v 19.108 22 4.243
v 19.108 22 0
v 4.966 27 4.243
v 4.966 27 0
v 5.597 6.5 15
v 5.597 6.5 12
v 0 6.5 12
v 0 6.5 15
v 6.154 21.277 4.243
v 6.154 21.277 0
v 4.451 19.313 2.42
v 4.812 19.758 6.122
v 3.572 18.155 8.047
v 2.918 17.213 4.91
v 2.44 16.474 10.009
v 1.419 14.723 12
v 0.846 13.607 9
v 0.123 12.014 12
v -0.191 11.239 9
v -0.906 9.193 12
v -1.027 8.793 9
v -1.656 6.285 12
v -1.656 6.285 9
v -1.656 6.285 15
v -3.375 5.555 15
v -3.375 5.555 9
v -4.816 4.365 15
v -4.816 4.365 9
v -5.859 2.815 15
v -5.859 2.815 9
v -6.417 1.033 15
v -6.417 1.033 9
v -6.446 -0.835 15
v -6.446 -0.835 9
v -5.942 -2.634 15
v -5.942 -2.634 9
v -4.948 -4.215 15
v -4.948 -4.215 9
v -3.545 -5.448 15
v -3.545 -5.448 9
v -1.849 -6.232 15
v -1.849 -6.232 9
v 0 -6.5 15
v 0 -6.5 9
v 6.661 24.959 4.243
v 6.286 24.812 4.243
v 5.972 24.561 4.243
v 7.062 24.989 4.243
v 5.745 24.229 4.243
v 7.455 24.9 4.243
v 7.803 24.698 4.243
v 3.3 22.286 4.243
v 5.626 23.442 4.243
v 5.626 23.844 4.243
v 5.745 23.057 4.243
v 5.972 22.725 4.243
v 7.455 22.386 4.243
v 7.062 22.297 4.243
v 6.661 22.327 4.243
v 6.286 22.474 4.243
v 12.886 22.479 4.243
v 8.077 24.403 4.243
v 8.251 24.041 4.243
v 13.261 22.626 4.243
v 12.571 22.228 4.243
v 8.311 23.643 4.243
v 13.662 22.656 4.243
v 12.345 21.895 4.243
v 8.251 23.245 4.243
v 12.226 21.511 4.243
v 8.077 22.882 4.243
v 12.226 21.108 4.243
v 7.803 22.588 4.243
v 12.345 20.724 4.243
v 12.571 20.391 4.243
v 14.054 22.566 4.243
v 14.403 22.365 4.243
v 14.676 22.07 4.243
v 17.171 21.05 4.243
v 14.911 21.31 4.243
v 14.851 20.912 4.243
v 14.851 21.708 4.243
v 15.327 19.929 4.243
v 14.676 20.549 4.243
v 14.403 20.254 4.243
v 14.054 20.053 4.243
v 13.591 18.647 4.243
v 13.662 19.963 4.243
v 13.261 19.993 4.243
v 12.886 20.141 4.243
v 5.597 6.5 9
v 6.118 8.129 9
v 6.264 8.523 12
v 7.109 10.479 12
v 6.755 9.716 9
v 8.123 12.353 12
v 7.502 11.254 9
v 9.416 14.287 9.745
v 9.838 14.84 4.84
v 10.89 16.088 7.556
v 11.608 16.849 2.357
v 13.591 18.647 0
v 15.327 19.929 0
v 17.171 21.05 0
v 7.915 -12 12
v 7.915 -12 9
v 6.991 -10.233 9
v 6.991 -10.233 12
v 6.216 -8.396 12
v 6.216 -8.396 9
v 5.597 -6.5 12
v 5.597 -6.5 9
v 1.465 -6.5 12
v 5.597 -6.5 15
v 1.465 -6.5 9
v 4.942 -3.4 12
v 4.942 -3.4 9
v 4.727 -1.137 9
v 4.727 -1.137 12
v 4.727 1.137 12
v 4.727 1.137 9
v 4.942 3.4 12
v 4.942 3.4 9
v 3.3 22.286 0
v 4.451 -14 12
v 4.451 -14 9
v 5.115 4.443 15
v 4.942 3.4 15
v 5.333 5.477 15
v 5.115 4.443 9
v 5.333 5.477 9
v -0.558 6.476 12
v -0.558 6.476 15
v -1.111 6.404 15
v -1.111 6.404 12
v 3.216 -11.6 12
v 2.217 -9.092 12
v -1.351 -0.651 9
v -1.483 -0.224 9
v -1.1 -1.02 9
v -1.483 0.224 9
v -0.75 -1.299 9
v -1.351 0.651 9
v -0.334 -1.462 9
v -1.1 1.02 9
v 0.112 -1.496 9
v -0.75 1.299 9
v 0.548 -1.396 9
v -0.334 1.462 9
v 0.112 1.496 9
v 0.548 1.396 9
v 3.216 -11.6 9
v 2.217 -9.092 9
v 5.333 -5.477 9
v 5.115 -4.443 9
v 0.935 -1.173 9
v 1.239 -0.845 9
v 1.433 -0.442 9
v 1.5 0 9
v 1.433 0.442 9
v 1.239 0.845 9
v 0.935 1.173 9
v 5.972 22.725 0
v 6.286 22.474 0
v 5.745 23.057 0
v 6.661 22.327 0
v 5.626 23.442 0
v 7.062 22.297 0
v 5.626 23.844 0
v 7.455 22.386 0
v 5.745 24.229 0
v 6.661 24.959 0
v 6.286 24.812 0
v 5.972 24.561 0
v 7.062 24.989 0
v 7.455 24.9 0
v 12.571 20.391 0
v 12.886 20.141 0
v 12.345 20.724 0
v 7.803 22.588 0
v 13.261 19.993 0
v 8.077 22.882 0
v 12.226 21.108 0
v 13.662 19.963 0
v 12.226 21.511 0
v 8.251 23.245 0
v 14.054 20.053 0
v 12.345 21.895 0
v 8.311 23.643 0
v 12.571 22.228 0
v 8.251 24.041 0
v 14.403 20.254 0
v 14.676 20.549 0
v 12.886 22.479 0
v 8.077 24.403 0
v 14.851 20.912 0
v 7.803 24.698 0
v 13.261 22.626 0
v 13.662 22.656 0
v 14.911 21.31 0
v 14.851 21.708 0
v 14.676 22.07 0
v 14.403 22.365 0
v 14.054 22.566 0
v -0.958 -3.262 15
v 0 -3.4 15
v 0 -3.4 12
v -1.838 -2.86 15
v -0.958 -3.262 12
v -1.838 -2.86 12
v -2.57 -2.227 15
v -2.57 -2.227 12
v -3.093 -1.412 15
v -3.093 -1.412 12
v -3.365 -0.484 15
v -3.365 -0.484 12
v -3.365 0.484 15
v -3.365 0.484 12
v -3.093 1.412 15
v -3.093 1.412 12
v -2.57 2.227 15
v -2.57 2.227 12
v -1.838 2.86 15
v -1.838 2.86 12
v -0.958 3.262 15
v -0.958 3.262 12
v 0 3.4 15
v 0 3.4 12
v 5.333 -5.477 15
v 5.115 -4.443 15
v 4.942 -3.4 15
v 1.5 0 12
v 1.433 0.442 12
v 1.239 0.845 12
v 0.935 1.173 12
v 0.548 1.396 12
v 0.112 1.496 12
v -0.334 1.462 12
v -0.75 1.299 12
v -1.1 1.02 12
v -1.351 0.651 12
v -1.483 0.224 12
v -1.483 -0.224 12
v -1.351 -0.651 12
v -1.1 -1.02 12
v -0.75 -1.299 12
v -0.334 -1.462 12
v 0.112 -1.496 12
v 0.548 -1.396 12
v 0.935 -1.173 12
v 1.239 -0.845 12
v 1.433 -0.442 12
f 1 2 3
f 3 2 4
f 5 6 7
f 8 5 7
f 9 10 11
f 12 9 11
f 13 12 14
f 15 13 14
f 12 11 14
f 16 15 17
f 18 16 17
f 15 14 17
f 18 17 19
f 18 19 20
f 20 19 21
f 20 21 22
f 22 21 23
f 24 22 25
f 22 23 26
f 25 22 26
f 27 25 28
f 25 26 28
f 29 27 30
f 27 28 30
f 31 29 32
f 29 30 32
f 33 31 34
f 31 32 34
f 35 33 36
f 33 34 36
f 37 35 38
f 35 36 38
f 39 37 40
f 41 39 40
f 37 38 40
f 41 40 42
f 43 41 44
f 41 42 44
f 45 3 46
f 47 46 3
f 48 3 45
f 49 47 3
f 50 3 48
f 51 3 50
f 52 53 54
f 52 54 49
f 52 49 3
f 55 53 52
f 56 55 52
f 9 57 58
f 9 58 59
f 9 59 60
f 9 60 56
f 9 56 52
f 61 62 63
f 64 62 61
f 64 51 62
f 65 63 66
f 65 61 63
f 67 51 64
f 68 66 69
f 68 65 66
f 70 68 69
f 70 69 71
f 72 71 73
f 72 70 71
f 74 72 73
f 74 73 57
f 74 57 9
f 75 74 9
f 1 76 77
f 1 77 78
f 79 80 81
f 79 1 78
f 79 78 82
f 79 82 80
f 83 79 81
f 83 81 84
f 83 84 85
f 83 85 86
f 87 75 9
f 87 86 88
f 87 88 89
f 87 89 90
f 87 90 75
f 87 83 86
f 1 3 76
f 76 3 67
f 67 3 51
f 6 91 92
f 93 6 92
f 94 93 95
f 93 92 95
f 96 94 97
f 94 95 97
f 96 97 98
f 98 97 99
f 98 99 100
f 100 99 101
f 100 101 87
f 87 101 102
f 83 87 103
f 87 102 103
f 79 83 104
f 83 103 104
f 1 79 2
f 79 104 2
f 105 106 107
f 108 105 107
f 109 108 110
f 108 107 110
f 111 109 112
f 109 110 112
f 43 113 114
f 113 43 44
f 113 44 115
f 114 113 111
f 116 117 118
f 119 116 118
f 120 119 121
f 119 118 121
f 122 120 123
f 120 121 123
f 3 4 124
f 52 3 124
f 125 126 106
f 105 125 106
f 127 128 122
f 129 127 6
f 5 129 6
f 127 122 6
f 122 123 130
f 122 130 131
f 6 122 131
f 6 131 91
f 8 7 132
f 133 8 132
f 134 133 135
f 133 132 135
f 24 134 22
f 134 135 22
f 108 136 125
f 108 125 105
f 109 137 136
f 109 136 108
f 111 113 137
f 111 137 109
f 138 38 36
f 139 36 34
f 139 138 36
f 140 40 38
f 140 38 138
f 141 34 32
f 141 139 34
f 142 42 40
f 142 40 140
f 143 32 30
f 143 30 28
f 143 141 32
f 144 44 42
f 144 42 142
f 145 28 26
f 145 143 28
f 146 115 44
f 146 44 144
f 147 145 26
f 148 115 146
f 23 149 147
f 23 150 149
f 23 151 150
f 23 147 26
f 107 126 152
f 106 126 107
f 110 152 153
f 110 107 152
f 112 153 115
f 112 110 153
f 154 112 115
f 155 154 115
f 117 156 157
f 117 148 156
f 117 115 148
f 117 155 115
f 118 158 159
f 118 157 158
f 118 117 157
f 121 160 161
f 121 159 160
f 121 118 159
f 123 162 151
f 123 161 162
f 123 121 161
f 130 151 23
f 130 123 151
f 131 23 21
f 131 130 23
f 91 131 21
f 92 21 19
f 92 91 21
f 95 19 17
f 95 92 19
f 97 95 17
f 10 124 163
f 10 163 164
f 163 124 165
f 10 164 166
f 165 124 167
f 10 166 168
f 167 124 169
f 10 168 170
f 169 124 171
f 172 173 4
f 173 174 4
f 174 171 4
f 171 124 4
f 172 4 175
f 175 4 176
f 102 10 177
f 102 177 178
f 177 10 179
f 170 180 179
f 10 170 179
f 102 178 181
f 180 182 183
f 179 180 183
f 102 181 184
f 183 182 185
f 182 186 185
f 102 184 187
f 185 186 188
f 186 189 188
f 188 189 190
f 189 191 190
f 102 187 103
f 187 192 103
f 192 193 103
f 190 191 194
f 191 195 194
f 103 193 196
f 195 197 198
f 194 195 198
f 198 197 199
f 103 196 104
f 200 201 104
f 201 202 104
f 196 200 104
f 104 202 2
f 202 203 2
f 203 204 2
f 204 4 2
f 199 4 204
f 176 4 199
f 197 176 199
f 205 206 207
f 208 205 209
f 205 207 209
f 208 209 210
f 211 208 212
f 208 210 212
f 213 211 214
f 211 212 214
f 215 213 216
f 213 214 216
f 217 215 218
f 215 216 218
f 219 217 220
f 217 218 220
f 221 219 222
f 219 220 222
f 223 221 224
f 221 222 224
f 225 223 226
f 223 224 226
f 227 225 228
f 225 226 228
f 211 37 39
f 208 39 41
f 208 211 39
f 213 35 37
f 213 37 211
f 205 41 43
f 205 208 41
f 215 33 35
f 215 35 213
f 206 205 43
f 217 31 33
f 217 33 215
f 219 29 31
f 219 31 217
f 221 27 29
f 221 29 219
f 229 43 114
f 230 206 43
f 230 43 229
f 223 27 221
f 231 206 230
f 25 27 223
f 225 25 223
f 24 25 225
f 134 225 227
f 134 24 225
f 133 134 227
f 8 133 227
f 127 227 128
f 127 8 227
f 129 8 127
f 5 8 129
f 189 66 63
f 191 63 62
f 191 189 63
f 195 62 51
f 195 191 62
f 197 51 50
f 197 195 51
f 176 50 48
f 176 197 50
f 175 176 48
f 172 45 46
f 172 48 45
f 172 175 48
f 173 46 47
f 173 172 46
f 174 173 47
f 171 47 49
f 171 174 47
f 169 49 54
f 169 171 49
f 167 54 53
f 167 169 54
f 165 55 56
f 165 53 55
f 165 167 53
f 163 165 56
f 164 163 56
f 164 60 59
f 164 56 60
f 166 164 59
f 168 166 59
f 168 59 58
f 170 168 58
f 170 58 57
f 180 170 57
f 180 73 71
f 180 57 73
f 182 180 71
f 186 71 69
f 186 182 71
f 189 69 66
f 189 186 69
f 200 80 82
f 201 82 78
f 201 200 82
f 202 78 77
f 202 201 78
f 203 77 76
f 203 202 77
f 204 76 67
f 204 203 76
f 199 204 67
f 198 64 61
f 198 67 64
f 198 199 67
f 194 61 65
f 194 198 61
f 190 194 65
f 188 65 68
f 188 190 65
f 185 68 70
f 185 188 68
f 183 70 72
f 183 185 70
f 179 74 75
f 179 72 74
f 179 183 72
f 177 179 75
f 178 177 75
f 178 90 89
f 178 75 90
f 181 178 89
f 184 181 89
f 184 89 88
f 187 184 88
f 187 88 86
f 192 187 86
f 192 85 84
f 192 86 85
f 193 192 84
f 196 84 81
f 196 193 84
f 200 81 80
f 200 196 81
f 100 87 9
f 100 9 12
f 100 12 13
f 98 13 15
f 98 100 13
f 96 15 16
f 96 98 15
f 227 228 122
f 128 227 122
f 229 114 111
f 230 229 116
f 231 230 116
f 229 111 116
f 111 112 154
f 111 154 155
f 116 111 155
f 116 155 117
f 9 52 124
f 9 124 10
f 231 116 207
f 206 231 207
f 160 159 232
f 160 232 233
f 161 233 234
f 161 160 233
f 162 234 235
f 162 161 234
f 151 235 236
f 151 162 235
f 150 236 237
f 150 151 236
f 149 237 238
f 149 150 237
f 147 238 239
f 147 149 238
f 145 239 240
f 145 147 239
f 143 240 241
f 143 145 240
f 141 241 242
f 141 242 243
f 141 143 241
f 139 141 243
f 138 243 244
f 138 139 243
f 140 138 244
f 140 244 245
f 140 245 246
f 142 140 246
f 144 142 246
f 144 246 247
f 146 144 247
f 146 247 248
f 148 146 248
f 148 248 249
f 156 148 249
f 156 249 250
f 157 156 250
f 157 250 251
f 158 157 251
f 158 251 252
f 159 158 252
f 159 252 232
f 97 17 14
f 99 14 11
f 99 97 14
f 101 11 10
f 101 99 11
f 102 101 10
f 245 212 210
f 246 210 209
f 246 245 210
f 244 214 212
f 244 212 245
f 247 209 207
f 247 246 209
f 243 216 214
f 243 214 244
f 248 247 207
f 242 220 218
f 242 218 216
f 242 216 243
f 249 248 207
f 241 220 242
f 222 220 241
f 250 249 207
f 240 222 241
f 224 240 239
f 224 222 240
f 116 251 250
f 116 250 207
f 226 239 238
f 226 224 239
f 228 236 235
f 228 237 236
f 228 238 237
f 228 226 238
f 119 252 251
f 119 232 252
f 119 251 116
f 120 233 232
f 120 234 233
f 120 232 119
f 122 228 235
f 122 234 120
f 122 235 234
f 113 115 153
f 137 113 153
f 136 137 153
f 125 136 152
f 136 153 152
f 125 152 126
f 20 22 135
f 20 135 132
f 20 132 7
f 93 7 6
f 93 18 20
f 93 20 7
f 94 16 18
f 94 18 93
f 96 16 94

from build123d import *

# Parameters (mm, degrees)
RESSALTO_EXTRUS_O1_DEPTH   = 15
ESBO_O1_3_R                = 1.5
RESSALTO_EXTRUS_O2_DEPTH   = 12
ESBO_O1_4_R                = 1.35
RESSALTO_EXTRUS_O3_DEPTH   = 12
CORTE_EXTRUS_O1_DEPTH      = 38.624816903
CORTE_EXTRUS_O1_DEPTH_BACK = 38.624816903


with BuildPart() as part:
    # Esboço1 → Ressalto-extrusão1 (new body)
    with BuildSketch(Plane.XY):
        with BuildLine():
            ThreePointArc((0, -3.4), (-3.4, 0), (0, 3.4))
            Line((0, 3.4), (4.942053961, 3.4))
            ThreePointArc((4.942053961, 3.4), (5.218299225, 4.96081936), (5.596969896, 6.5))
            Line((5.596969896, 6.5), (0, 6.5))
            ThreePointArc((0, 6.5), (-0.834966341, 6.446148556), (-1.656097561, 6.285486526))
            ThreePointArc((-1.656097561, 6.285486526), (-6.446148556, -0.834966341), (0, -6.5))
            Line((0, -6.5), (1.464912337, -6.5))
            Line((1.464912337, -6.5), (5.596969896, -6.5))
            ThreePointArc((5.596969896, -6.5), (5.218299225, -4.96081936), (4.942053961, -3.4))
            Line((4.942053961, -3.4), (0, -3.4))
        make_face()
    extrude(amount=RESSALTO_EXTRUS_O1_DEPTH)

    # Esboço1<3> → Ressalto-extrusão2 (add)
    with BuildSketch(Plane.XY):
        with BuildLine():
            Line((4.942053961, 3.4), (0, 3.4))
            ThreePointArc((0, 3.4), (-3.4, 0), (0, -3.4))
            Line((0, -3.4), (4.942053961, -3.4))
            ThreePointArc((4.942053961, -3.4), (4.7, 0), (4.942053961, 3.4))
        make_face()
        Circle(ESBO_O1_3_R, mode=Mode.SUBTRACT)
    extrude(amount=RESSALTO_EXTRUS_O2_DEPTH)

    # Esboço1<4> → Ressalto-extrusão3 (add)
    # profile 1 of 2: a face of its own
    with BuildSketch(Plane.XY):
        with BuildLine():
            Line((0, 6.5), (5.596969896, 6.5))
            ThreePointArc((5.596969896, 6.5), (10.608614203, 15.770280909), (19.108336953, 22))
            Line((19.108336953, 22), (4.96620133, 27))
            Line((4.96620133, 27), (3.299534663, 22.285954792))
            Line((3.299534663, 22.285954792), (6.154368486, 21.276618614))
            ThreePointArc((6.154368486, 21.276618614), (1.207605686, 14.323695574), (-1.656097561, 6.285486526))
            ThreePointArc((-1.656097561, 6.285486526), (-0.834966341, 6.446148556), (0, 6.5))
        make_face()
        with Locations((6.961295121, 23.642977396)):
            Circle(ESBO_O1_4_R, mode=Mode.SUBTRACT)
        with Locations((13.560958412, 21.309644063)):
            Circle(ESBO_O1_4_R, mode=Mode.SUBTRACT)
    # profile 2 of 2: a face of its own
    with BuildSketch(Plane.XY):
        with BuildLine():
            ThreePointArc((7.915390309, -12), (6.584536367, -9.322353153), (5.596969896, -6.5))
            Line((5.596969896, -6.5), (1.464912337, -6.5))
            ThreePointArc((1.464912337, -6.5), (2.686390311, -10.358190524), (4.451288694, -14))
            Line((4.451288694, -14), (7.915390309, -12))
        make_face()
    extrude(amount=RESSALTO_EXTRUS_O3_DEPTH)

    # Esboço2 → Corte-extrusão1 (cut, two sides: drawn at the far end of the back side and taken through both)
    with BuildSketch(Plane(origin=(-4.070880192, 1.439273495, 0), x_dir=(0, 0, 1), z_dir=(-0.9428090415820632, 0.33333333333333404, 0)).offset(-CORTE_EXTRUS_O1_DEPTH_BACK)):
        Polygon((0, -11.715563684), (9, -11.715563684), (9, 13.111244566), (0, 22.111244566), align=None)
        Polygon((4.242640687, 27.111244566), (4.242640687, 22.111244566), (12, 14.353885253), (12, 27.111244566), align=None)
    extrude(amount=CORTE_EXTRUS_O1_DEPTH + CORTE_EXTRUS_O1_DEPTH_BACK, mode=Mode.SUBTRACT)


solid = part.part
